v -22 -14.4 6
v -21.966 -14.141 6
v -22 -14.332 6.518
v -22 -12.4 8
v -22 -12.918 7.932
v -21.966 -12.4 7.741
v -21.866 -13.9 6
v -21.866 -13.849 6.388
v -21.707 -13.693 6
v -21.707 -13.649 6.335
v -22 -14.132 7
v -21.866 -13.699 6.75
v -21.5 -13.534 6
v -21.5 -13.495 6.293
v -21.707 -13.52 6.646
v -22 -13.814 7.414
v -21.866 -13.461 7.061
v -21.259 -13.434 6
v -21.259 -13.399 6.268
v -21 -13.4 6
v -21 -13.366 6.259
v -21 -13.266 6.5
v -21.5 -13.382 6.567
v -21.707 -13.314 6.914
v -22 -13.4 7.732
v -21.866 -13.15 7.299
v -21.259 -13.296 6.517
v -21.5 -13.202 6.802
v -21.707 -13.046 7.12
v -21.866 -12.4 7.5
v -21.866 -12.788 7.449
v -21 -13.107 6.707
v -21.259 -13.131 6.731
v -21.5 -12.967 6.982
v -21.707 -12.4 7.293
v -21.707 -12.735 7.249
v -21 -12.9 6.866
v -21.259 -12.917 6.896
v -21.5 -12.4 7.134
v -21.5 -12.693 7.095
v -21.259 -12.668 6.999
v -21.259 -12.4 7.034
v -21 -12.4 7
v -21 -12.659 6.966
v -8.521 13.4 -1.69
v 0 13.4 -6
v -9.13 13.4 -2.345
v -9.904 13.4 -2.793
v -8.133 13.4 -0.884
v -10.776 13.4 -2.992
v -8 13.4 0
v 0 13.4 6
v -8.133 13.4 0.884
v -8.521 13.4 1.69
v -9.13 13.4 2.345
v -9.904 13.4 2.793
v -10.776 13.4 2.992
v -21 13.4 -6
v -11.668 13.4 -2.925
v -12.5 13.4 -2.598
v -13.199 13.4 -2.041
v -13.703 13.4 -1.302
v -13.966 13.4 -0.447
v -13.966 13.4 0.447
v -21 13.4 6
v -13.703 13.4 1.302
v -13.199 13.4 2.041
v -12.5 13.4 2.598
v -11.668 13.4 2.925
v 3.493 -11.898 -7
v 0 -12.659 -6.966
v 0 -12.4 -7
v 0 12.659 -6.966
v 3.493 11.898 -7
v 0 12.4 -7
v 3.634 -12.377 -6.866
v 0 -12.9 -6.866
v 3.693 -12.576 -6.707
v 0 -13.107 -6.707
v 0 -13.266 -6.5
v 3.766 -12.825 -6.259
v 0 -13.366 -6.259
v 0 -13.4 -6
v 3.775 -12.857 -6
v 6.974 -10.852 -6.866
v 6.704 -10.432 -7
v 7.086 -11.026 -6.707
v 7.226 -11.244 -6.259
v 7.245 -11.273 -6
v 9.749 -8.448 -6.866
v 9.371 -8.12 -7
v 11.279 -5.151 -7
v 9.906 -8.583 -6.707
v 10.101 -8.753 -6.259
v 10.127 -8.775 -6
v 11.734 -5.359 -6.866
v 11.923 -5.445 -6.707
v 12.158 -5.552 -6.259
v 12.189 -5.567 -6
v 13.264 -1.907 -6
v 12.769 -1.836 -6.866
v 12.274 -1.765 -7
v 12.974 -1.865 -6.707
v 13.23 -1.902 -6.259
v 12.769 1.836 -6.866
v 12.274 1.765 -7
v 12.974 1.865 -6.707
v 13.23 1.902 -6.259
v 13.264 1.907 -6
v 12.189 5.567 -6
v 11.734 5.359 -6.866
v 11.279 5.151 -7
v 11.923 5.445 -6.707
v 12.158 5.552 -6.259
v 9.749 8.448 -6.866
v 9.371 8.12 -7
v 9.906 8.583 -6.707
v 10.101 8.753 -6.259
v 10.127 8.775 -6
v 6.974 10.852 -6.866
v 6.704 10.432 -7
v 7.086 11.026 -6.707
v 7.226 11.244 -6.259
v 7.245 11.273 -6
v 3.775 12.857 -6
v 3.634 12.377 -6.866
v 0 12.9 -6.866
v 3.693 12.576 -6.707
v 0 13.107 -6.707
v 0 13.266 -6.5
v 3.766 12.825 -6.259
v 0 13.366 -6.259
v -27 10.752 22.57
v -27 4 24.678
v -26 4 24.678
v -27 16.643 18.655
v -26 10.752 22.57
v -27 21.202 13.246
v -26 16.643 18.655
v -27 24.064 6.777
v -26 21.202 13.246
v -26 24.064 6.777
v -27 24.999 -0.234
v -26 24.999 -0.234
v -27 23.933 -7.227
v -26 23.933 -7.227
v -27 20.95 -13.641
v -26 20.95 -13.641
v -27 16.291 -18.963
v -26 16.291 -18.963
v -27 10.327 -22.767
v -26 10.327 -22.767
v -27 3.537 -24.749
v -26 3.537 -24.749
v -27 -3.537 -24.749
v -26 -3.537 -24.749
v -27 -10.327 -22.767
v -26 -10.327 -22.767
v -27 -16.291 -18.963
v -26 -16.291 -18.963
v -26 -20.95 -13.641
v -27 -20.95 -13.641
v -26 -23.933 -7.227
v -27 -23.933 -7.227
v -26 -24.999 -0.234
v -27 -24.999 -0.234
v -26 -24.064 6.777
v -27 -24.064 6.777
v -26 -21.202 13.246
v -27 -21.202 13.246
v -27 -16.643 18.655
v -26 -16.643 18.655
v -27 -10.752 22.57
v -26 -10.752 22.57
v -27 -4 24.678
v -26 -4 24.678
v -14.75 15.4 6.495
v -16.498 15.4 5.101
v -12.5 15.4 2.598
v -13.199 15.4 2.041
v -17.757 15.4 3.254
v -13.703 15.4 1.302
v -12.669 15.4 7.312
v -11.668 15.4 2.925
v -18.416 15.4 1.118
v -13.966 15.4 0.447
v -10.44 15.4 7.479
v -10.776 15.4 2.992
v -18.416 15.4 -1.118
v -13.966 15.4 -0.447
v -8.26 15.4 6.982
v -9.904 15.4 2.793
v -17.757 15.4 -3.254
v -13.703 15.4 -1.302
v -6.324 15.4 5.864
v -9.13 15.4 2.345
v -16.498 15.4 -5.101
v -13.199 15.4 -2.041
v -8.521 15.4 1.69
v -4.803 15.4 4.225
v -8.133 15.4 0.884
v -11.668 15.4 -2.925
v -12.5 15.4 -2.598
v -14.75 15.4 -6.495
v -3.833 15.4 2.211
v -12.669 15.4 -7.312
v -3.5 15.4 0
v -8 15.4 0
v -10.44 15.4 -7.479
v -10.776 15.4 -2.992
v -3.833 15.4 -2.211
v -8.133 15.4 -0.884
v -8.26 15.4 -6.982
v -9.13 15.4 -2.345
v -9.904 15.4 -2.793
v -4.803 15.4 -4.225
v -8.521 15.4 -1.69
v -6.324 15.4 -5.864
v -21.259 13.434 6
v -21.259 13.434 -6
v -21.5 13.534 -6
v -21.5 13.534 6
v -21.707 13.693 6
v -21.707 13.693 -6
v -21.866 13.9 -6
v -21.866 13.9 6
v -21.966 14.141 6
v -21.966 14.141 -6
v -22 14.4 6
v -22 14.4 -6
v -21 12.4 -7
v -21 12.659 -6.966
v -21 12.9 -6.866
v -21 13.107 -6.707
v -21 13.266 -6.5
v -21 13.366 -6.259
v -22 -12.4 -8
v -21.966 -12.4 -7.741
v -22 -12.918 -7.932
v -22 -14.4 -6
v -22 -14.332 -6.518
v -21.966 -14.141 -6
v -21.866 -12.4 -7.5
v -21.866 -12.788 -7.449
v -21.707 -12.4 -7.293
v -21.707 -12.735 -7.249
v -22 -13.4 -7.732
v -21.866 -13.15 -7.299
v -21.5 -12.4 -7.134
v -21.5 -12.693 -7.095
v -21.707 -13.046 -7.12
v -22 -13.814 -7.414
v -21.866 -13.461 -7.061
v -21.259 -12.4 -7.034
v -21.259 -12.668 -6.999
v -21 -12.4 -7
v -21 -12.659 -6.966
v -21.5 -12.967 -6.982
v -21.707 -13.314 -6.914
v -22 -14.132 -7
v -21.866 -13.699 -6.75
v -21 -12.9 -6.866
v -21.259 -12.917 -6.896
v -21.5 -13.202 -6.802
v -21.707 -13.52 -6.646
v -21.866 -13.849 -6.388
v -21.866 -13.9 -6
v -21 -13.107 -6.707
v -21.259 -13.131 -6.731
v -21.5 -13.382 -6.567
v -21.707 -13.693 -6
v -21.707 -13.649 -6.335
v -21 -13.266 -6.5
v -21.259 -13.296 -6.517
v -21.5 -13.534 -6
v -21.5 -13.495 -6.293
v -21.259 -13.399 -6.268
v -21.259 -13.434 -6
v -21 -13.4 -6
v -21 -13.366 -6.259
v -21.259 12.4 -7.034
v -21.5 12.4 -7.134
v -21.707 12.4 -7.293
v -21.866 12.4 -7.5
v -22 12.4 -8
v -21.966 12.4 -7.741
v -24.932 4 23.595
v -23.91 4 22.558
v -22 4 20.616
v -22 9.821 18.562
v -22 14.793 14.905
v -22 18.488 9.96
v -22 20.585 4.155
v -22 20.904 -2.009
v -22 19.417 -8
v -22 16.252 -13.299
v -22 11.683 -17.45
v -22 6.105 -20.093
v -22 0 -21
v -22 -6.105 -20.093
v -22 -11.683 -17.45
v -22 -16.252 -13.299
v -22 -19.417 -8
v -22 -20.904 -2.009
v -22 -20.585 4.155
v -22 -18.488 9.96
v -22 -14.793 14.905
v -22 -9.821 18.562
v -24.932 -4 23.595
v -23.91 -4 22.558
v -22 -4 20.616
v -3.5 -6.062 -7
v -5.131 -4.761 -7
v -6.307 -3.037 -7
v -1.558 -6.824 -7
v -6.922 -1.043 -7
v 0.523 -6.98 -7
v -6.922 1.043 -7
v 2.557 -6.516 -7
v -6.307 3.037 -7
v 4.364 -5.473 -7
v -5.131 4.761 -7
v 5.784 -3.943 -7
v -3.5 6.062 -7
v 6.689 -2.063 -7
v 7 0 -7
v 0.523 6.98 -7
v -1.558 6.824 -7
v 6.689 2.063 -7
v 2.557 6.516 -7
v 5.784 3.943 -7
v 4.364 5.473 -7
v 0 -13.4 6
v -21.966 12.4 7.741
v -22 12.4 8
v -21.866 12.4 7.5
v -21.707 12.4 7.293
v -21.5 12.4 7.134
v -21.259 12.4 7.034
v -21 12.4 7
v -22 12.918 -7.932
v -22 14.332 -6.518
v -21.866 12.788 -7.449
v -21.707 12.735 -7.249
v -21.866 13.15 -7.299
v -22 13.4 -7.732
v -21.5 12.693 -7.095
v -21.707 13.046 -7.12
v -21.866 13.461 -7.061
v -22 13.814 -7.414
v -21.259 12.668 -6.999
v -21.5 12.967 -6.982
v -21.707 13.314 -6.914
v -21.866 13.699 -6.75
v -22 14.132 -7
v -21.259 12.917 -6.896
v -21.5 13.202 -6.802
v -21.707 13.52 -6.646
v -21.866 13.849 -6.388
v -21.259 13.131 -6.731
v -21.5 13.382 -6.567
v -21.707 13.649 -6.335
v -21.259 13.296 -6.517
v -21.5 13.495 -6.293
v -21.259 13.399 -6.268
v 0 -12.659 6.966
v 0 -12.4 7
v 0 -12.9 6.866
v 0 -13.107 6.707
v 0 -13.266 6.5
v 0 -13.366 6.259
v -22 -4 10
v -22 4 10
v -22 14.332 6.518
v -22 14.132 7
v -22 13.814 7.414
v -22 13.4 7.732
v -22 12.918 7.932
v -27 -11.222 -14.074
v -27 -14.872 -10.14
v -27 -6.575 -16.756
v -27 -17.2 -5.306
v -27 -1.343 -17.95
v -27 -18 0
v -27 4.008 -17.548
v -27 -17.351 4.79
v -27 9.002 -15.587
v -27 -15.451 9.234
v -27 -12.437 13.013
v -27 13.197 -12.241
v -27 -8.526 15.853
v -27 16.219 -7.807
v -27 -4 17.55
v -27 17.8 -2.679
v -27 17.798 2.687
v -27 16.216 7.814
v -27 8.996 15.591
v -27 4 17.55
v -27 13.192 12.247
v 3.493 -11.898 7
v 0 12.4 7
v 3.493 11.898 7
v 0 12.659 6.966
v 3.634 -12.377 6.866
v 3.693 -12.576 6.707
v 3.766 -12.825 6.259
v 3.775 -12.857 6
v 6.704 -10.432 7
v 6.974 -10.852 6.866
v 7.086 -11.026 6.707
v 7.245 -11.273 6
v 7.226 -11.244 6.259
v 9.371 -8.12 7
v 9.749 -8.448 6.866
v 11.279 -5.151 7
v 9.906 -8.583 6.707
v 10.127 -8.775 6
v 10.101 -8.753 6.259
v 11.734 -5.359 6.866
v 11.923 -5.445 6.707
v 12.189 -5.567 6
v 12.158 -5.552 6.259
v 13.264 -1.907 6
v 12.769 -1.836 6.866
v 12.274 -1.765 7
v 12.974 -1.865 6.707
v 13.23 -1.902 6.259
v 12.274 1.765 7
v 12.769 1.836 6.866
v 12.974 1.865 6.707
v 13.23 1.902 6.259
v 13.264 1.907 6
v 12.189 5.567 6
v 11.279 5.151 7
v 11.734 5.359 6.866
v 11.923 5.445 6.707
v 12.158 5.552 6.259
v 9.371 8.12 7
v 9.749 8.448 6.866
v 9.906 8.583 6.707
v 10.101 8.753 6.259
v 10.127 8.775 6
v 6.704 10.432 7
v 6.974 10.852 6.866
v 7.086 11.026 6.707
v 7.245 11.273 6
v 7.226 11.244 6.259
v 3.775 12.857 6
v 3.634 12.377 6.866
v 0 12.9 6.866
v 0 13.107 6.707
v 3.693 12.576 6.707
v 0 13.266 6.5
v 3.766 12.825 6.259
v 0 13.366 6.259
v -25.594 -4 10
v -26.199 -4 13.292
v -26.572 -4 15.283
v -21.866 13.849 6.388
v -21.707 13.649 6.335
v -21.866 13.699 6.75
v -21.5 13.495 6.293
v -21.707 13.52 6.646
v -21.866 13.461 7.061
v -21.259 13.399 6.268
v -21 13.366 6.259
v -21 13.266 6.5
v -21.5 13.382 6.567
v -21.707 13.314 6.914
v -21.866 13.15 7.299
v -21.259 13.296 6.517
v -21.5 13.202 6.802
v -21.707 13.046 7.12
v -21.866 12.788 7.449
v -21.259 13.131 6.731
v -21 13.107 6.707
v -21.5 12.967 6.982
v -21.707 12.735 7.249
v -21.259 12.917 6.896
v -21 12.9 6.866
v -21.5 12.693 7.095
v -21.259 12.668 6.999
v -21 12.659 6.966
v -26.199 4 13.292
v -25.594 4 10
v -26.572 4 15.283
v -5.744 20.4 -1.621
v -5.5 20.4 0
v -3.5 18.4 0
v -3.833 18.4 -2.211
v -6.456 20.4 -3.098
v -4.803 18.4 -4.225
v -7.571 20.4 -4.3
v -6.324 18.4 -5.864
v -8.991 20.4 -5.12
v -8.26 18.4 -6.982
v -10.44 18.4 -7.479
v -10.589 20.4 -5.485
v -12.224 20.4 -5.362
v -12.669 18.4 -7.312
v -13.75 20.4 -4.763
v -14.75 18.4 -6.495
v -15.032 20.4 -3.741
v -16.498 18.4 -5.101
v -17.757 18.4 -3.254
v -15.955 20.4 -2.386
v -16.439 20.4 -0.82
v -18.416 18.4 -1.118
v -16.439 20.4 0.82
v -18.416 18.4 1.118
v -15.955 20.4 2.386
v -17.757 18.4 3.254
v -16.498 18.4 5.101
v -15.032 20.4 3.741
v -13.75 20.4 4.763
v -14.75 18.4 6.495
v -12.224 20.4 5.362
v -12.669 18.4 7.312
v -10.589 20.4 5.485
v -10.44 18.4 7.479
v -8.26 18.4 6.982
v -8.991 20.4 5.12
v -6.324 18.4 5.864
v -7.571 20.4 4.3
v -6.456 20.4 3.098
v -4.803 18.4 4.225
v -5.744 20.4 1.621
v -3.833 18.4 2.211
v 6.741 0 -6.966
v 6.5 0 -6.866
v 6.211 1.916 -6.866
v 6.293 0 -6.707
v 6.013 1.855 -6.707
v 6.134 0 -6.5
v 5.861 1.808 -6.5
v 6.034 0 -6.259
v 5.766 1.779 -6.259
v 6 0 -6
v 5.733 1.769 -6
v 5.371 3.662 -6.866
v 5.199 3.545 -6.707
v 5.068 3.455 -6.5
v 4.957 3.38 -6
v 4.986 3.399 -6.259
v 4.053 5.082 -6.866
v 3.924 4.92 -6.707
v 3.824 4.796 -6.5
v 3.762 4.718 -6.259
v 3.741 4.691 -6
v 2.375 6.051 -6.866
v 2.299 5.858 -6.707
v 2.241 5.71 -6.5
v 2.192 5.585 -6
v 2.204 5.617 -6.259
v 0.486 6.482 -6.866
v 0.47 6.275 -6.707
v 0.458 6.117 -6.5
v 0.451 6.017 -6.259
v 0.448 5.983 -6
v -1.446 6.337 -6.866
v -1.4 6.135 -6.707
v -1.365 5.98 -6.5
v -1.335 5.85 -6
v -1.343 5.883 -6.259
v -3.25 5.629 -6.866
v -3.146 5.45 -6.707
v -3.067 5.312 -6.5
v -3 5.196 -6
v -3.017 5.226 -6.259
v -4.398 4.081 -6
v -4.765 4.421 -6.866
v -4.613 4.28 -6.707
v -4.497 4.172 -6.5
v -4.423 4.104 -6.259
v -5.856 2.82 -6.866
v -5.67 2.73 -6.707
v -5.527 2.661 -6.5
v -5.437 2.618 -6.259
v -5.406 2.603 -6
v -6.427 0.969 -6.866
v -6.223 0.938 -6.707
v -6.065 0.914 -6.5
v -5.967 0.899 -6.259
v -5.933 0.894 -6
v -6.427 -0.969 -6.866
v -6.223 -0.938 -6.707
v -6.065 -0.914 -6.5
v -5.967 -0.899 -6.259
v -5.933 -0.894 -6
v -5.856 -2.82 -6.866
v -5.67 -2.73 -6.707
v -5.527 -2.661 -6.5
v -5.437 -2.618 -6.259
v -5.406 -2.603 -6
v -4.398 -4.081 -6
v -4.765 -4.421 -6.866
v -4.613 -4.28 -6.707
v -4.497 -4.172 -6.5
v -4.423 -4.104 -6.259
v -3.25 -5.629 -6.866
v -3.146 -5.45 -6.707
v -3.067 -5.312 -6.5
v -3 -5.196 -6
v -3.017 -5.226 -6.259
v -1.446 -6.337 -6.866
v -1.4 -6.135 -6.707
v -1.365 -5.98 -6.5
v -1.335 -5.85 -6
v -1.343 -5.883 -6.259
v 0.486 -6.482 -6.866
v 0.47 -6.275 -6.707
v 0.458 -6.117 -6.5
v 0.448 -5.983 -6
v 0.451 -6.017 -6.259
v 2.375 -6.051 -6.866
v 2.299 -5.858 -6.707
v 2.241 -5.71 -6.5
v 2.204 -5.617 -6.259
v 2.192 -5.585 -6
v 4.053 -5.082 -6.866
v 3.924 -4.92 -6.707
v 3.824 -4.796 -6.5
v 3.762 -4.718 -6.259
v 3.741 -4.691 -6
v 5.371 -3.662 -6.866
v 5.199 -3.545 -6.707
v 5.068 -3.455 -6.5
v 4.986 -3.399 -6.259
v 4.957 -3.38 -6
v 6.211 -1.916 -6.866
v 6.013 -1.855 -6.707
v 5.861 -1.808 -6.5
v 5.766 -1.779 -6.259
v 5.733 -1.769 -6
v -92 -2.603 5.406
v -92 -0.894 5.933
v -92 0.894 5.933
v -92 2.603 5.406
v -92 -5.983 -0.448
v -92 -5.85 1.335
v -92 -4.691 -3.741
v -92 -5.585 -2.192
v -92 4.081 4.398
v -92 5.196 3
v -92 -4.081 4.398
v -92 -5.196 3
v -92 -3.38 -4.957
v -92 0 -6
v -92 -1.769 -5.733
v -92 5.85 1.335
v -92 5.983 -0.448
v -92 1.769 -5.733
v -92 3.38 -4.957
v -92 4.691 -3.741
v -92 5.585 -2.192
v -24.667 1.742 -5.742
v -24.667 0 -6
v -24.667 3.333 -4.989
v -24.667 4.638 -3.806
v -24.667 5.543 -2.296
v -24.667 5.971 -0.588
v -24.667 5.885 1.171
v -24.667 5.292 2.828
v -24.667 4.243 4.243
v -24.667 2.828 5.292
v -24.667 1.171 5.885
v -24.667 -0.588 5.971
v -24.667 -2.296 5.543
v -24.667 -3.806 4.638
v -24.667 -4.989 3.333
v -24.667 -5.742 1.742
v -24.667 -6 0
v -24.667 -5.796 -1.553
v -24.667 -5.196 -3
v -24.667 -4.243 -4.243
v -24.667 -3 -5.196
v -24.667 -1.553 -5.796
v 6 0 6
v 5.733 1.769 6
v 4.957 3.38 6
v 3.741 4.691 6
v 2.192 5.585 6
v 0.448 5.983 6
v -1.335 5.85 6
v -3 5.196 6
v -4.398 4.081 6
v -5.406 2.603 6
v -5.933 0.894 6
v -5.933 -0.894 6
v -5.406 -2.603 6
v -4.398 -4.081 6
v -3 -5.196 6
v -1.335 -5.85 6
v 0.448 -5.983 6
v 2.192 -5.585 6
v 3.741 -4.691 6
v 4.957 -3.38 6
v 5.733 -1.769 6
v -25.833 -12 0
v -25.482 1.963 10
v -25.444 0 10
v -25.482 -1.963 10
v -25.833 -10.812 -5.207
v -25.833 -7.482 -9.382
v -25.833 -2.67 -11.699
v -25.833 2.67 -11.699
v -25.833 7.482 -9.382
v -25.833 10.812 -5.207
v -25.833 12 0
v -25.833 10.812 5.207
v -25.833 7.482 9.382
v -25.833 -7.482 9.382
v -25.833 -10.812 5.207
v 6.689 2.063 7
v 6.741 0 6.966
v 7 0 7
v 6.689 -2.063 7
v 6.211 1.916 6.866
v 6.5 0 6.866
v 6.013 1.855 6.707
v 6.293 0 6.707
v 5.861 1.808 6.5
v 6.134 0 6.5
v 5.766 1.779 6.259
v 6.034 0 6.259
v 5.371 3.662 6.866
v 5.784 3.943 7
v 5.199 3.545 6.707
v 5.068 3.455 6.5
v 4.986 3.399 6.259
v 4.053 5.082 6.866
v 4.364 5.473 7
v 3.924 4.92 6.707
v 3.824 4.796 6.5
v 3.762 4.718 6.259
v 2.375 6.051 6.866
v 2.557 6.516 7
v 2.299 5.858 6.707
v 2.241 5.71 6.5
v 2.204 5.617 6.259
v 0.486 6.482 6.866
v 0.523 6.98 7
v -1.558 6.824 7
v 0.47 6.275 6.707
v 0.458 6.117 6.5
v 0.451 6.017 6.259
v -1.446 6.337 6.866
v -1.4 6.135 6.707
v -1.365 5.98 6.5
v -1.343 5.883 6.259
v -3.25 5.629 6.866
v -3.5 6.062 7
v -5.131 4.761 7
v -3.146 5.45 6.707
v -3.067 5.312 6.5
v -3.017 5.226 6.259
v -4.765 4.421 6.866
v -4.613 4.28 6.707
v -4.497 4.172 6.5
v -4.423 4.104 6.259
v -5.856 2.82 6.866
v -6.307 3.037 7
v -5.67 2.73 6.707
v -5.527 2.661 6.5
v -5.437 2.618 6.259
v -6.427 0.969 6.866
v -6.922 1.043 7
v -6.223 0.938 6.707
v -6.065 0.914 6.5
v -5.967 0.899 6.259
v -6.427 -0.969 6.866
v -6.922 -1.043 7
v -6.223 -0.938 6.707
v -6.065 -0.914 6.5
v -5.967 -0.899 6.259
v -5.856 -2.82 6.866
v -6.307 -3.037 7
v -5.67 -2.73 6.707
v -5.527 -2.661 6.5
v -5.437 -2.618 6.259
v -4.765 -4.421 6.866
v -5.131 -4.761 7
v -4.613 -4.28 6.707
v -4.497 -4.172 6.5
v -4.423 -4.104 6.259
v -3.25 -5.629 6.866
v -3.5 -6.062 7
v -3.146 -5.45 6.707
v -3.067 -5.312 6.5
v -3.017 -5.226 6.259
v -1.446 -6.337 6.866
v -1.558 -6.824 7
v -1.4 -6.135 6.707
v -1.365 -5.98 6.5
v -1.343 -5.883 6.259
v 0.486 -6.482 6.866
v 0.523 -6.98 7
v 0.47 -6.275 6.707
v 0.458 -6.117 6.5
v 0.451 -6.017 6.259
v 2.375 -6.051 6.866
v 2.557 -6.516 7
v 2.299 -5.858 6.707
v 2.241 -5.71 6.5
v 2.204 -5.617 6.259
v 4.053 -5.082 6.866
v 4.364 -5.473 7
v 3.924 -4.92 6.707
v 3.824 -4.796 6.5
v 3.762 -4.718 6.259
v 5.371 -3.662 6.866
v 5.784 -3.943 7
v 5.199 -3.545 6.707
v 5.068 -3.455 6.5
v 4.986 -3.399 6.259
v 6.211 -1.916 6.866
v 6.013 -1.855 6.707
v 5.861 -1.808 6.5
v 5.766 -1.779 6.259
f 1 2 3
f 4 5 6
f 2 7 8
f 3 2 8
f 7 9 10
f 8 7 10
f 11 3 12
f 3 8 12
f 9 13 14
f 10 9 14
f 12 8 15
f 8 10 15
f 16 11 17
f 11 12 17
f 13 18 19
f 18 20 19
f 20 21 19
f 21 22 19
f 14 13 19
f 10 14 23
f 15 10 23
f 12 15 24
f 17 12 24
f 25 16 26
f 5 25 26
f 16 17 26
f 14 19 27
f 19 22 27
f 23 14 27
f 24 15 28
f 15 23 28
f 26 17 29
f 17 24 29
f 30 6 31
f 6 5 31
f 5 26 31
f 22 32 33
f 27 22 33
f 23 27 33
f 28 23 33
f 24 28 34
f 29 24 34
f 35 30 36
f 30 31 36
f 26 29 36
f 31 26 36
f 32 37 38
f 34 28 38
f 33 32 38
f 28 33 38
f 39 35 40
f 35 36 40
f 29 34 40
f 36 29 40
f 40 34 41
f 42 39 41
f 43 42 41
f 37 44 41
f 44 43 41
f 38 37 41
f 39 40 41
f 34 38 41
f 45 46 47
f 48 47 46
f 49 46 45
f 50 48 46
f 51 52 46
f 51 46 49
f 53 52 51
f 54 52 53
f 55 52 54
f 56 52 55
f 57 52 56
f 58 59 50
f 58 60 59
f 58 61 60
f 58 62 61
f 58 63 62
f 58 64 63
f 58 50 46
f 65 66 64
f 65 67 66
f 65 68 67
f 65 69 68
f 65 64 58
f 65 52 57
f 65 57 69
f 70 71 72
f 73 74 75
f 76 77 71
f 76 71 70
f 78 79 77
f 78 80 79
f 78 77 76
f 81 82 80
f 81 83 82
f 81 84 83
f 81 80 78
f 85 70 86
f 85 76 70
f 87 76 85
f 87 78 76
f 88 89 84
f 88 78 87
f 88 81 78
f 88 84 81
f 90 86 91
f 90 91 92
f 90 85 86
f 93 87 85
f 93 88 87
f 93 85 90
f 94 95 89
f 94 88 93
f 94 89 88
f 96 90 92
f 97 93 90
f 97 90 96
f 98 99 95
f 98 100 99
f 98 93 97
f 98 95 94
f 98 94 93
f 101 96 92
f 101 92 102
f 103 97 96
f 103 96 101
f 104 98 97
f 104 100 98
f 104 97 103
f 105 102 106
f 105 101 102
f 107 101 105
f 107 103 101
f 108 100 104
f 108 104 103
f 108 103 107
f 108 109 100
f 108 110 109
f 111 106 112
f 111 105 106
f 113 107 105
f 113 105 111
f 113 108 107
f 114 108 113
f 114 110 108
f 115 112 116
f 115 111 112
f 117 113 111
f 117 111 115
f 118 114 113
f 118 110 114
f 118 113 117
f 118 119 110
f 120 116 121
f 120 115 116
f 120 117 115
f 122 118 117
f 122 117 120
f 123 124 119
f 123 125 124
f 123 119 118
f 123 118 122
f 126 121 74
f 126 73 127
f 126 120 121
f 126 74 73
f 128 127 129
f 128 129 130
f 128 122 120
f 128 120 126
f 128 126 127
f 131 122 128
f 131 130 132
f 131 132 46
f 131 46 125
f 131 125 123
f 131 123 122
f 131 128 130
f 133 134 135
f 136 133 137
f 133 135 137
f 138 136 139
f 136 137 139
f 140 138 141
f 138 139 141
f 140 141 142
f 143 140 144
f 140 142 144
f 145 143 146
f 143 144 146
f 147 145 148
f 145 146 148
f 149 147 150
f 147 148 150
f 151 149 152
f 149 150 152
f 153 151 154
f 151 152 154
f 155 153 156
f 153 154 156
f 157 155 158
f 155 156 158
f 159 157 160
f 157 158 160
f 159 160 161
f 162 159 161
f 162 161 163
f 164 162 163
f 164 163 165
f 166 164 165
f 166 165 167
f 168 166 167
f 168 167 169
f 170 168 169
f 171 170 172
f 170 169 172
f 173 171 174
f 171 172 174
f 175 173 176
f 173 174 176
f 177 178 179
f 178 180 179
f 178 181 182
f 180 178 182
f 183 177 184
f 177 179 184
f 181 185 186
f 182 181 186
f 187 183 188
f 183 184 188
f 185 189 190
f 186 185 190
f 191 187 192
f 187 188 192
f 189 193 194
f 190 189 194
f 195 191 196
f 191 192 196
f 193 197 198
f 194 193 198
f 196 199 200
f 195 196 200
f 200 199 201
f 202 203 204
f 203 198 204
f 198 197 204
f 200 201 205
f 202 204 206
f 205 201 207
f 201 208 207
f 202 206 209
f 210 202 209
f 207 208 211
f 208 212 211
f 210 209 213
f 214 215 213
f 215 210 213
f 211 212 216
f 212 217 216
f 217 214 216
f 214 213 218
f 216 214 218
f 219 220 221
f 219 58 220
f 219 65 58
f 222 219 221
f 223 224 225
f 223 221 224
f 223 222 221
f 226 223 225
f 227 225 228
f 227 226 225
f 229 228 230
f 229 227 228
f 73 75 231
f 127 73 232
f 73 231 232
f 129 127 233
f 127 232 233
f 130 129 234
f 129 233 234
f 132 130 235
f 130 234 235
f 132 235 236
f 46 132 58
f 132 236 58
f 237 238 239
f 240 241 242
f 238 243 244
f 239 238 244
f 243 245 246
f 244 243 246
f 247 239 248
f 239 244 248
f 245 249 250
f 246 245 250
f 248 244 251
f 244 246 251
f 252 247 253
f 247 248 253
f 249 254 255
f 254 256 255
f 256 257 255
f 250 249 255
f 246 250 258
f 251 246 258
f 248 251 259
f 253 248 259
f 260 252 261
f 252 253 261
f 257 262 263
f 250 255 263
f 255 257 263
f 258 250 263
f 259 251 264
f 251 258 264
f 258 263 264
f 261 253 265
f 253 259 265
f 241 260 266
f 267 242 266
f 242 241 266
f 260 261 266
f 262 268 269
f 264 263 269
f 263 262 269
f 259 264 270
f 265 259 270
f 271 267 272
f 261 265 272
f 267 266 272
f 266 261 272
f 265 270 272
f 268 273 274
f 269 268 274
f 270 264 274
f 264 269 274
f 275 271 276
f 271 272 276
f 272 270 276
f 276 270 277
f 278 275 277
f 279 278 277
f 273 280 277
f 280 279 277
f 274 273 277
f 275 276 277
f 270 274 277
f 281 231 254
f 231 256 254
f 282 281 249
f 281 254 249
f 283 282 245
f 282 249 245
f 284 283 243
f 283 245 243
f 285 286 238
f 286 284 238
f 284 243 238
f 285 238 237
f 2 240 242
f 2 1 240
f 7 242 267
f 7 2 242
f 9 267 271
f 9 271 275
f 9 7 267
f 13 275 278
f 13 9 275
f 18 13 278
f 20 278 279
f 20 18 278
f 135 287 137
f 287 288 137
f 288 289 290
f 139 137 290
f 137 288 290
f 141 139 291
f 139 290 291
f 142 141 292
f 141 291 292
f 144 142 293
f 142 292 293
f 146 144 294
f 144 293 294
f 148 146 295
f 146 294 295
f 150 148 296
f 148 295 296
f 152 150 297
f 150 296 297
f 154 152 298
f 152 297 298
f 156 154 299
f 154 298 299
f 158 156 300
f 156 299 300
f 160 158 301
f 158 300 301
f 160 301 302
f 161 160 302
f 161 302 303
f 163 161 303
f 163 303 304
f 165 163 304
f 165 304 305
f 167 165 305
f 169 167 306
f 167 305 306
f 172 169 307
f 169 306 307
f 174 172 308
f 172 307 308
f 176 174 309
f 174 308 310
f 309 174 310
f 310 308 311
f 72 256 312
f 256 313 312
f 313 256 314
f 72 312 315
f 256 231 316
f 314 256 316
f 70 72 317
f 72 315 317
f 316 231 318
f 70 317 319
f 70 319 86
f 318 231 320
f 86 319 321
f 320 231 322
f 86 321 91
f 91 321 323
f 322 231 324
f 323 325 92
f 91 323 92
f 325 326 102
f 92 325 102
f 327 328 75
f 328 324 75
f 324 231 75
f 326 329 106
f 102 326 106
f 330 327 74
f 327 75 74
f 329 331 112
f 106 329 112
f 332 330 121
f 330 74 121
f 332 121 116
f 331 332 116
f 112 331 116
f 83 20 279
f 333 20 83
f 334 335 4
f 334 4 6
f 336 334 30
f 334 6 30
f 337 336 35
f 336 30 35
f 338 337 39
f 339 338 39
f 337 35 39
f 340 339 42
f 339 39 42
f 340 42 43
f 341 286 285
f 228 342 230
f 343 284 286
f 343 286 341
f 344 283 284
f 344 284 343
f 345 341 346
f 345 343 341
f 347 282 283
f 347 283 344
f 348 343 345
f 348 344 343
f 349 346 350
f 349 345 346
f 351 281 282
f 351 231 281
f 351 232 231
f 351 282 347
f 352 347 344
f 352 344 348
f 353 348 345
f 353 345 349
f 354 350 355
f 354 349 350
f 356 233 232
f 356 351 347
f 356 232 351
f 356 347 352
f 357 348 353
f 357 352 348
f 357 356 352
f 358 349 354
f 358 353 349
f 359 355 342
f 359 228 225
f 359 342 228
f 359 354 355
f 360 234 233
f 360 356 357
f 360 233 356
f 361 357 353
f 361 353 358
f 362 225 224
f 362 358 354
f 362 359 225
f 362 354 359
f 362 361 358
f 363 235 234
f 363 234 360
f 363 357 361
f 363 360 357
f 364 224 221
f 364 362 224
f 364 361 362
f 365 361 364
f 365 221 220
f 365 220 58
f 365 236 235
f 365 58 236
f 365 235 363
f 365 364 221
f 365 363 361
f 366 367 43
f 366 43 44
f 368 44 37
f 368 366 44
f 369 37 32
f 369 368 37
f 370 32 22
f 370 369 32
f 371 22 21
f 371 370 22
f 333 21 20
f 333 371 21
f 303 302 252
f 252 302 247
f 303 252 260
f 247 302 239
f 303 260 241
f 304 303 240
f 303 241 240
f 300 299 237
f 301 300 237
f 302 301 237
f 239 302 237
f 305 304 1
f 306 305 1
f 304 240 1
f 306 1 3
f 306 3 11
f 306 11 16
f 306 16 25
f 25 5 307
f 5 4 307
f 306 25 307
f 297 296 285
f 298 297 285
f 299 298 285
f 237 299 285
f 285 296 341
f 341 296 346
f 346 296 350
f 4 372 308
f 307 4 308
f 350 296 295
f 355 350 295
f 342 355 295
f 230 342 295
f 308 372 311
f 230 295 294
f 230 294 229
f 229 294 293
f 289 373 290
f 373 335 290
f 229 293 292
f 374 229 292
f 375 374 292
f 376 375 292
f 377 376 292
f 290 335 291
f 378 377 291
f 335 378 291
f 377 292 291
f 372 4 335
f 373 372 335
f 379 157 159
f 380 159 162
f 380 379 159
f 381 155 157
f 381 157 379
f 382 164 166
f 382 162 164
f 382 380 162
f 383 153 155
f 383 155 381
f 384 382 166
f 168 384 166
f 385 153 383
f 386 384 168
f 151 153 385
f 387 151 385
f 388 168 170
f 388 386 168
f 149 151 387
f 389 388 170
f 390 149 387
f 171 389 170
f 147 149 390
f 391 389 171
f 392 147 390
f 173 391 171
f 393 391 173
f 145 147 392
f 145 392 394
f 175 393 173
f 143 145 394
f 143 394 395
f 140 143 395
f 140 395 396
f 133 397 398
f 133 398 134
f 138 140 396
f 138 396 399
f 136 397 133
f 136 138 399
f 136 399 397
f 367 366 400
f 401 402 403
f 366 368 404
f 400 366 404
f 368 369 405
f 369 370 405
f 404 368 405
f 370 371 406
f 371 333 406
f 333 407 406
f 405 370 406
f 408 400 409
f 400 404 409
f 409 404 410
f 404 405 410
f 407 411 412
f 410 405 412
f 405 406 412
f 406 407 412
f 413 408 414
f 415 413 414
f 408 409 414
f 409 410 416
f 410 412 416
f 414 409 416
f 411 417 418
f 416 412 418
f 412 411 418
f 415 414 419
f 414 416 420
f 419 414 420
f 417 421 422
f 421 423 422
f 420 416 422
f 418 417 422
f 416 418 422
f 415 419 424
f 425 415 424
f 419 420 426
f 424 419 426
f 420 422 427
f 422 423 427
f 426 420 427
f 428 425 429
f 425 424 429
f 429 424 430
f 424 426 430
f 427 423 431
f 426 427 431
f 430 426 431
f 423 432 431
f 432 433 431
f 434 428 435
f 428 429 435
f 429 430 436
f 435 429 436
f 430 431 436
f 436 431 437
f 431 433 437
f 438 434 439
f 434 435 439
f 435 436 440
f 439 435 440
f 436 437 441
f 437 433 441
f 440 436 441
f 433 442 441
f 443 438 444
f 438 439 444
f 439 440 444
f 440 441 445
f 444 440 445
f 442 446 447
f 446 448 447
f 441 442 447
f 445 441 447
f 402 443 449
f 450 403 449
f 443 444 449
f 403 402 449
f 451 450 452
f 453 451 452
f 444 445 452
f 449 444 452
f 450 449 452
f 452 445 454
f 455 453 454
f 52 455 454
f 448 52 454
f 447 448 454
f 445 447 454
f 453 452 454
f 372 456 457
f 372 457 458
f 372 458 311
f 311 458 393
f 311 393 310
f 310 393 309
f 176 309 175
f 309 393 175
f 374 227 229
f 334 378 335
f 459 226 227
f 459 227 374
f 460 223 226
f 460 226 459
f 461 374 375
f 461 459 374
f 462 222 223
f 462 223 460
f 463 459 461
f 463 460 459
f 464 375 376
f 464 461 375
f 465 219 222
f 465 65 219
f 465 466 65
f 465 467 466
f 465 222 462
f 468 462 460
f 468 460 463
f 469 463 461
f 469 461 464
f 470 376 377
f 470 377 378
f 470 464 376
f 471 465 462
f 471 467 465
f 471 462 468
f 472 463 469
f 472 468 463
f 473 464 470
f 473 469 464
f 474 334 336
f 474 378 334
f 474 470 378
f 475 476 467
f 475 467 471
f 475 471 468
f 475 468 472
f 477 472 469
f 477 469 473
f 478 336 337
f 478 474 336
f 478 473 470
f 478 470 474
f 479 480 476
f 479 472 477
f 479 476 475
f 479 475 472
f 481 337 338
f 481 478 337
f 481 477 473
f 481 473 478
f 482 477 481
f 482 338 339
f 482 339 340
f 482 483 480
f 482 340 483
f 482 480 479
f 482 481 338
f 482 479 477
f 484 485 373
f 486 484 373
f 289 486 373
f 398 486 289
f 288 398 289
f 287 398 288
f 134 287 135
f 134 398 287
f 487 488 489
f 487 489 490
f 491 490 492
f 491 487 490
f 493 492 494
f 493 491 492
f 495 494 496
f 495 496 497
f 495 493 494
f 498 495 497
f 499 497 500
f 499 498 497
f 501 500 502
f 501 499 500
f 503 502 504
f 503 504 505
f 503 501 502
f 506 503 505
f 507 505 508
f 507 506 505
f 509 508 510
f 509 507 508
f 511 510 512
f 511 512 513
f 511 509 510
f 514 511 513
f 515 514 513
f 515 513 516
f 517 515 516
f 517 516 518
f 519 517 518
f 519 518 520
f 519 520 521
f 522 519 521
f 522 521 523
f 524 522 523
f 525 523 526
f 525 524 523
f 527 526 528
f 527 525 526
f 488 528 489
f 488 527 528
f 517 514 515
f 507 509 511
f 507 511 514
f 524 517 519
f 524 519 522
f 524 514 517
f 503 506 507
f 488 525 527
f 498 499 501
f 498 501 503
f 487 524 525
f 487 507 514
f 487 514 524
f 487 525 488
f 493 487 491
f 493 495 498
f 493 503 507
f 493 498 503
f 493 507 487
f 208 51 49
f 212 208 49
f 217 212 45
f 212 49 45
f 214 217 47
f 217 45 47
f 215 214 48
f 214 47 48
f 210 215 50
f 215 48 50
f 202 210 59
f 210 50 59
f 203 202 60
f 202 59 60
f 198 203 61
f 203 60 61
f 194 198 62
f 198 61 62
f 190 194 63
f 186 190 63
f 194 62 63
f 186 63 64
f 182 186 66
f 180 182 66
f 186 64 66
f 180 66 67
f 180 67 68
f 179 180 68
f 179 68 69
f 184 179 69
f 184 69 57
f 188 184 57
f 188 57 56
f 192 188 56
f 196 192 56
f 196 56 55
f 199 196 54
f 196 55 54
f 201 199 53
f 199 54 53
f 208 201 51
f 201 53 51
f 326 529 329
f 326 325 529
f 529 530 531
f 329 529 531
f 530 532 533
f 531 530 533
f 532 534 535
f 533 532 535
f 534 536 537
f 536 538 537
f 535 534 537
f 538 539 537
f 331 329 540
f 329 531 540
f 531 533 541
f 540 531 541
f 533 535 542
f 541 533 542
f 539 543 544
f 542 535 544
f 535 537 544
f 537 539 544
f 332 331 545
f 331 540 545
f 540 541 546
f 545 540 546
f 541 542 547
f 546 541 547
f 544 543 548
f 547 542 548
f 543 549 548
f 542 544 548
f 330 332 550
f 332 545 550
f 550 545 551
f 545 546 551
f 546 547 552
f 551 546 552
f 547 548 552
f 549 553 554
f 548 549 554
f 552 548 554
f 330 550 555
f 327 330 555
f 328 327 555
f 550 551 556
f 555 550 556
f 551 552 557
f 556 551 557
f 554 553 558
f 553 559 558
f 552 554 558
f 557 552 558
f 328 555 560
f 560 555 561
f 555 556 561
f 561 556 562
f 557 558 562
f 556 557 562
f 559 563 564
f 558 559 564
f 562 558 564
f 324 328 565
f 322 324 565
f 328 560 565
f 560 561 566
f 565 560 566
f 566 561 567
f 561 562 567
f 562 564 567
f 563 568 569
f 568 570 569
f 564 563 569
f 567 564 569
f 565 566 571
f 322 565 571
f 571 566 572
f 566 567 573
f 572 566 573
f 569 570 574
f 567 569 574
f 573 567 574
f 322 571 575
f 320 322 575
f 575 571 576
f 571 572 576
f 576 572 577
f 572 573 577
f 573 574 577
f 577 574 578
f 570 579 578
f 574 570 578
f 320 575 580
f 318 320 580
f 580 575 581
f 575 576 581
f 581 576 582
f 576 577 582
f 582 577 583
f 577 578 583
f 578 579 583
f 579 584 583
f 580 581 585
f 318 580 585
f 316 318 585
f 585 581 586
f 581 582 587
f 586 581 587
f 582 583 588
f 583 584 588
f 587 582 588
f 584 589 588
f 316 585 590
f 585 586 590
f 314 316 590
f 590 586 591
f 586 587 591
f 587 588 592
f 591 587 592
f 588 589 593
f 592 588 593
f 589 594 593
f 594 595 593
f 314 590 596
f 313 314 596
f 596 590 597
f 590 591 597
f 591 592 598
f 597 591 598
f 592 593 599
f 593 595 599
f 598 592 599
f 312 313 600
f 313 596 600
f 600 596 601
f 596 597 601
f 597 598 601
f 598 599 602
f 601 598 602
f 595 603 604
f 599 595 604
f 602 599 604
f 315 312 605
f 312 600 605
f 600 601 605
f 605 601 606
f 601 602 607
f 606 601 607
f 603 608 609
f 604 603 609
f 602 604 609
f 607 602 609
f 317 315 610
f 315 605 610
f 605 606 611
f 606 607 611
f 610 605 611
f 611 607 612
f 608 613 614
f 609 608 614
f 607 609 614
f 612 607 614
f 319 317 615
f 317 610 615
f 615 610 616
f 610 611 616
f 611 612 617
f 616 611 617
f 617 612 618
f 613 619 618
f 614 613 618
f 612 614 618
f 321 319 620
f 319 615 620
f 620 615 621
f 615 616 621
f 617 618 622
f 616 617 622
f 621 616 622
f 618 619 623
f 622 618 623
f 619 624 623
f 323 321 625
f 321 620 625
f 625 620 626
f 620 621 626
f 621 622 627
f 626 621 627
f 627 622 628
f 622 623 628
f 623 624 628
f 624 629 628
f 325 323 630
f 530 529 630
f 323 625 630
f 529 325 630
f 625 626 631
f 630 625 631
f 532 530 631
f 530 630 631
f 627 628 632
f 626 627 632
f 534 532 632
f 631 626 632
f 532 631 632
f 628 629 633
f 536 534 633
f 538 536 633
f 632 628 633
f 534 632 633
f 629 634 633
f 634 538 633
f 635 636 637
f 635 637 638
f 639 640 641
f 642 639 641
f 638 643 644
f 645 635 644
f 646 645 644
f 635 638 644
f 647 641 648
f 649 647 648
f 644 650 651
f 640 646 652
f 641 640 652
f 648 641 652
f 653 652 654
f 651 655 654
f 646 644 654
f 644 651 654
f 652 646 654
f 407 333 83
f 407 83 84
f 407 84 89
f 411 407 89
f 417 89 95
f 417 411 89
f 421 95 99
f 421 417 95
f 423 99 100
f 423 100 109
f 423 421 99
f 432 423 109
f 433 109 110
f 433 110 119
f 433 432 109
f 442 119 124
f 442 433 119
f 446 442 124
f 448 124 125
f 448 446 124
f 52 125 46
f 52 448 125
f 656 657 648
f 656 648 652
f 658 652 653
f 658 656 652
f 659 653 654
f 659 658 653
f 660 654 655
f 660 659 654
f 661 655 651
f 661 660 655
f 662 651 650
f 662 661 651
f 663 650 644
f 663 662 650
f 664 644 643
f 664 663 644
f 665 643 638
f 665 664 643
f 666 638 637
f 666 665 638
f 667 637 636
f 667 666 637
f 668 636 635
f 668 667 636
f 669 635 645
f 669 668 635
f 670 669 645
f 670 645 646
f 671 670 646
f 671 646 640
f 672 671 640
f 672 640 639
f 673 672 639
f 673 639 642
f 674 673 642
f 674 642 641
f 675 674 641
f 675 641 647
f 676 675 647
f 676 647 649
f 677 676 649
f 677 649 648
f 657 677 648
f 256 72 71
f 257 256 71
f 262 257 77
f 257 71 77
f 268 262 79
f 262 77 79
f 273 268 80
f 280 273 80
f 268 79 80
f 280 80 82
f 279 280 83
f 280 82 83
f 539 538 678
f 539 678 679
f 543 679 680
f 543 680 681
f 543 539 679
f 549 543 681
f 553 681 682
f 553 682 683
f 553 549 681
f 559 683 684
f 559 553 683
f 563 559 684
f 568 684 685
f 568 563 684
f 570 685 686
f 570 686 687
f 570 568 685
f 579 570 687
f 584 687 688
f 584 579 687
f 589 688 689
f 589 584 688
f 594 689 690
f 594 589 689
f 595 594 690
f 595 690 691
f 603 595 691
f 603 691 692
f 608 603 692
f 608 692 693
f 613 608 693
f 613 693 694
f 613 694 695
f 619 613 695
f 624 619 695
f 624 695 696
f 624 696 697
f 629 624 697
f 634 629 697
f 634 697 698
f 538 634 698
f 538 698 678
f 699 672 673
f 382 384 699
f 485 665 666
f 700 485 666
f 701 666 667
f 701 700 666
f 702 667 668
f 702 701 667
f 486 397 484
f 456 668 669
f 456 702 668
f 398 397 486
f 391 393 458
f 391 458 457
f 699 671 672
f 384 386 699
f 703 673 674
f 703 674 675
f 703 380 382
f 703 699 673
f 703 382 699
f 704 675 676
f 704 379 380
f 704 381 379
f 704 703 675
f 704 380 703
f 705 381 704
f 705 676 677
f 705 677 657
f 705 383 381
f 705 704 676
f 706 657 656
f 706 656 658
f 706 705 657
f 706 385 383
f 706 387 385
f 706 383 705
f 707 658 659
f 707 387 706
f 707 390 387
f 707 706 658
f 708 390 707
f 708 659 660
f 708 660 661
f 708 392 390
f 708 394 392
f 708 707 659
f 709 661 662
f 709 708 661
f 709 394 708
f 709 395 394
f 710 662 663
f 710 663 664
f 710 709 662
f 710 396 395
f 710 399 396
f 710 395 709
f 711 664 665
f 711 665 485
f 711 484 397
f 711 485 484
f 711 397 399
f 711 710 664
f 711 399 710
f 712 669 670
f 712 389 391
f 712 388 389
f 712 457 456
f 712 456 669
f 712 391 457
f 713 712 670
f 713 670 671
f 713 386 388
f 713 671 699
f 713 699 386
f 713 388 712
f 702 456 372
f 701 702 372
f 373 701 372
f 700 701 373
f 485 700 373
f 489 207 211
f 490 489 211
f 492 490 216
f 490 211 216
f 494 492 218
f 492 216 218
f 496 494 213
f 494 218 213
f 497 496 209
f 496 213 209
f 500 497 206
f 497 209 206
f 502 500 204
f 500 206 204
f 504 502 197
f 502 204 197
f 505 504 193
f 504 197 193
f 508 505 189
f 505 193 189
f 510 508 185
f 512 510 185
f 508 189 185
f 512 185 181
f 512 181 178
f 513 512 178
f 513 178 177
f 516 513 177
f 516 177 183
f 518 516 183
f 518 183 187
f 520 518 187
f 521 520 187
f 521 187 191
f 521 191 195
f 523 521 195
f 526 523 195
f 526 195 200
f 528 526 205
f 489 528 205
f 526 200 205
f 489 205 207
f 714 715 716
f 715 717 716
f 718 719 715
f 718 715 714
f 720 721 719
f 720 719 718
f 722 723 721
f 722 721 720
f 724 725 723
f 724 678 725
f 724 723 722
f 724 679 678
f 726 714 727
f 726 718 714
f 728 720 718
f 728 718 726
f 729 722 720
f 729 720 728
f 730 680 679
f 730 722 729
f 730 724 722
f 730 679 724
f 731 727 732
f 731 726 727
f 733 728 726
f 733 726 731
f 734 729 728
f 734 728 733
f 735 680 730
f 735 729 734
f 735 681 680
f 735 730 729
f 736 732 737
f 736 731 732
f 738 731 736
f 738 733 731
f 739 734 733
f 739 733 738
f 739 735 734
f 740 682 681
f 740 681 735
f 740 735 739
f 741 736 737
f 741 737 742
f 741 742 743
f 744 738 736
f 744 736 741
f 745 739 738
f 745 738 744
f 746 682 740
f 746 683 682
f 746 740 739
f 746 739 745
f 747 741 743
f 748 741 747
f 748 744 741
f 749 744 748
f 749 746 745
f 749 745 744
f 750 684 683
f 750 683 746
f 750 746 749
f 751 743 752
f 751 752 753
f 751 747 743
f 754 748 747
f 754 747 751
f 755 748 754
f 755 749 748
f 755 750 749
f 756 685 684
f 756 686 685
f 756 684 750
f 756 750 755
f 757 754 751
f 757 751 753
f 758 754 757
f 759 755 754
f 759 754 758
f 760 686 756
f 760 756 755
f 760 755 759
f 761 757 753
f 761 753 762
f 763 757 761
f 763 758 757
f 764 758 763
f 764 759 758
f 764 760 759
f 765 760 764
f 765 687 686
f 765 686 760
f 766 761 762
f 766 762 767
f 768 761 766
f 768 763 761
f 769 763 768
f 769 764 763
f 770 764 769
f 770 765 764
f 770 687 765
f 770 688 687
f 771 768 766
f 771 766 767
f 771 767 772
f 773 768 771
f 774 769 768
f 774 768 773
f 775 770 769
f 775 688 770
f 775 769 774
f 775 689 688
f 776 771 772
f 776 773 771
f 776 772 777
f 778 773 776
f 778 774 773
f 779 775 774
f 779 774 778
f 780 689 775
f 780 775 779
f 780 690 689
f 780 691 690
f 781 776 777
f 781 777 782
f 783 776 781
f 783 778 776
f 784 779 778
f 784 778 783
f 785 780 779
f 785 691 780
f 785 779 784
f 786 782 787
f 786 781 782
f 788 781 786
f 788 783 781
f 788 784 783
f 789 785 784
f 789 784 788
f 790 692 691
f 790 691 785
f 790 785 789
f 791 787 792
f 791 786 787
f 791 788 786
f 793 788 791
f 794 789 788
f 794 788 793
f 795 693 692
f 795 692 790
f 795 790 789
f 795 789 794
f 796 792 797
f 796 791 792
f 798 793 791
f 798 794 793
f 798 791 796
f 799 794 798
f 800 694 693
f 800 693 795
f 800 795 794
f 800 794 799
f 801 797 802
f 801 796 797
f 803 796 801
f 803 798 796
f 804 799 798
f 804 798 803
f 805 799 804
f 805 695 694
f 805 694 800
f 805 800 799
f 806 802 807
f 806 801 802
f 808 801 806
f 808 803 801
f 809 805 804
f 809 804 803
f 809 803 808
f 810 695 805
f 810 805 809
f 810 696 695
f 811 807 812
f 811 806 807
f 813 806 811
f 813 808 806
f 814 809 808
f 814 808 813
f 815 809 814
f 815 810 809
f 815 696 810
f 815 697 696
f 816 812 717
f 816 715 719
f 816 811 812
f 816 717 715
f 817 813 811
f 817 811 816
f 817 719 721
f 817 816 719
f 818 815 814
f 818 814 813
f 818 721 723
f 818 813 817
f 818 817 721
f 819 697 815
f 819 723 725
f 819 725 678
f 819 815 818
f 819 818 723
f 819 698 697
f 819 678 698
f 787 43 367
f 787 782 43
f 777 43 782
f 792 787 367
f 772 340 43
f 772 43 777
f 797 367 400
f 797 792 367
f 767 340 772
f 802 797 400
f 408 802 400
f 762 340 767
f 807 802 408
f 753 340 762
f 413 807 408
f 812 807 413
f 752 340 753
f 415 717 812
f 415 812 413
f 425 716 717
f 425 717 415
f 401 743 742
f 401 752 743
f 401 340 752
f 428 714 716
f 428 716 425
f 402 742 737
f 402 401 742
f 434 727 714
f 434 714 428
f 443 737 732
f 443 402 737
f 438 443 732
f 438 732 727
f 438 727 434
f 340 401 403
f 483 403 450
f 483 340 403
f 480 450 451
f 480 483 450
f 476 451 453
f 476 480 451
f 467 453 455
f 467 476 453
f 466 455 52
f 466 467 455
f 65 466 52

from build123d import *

# Parameters (mm, degrees)
SKETCH1_R               = 6
BOSS_EXTRUDE3_DEPTH     = 7
SKETCH6_R               = 25
BOSS_EXTRUDE4_DEPTH     = 5
CHAMFER1_SIZE           = 4
SKETCH8_R               = 6
BOSS_EXTRUDE5_DEPTH     = 70
SKETCH9_R               = 3
BOSS_EXTRUDE6_DEPTH     = 2
SKETCH10_R              = 7.5
BOSS_EXTRUDE7_DEPTH     = 5
CHAMFER2_SIZE           = 2
SKETCH13_W              = 30
SKETCH13_H              = 8
CUT_EXTRUDE1_DEPTH      = 66
CUT_EXTRUDE1_DEPTH_BACK = 41.4
FILLET1_R               = 1


with BuildPart() as part:
    # Sketch1 → Boss-Extrude3 (new body, symmetric)
    with BuildSketch(Plane.XY):
        with BuildLine():
            Line((0, 13.4), (-22, 13.4))
            Line((-22, 13.4), (-22, -13.4))
            Line((-22, -13.4), (0, -13.4))
            ThreePointArc((0, -13.4), (13.4, 0), (0, 13.4))
        make_face()
        Circle(SKETCH1_R, mode=Mode.SUBTRACT)
    extrude(amount=BOSS_EXTRUDE3_DEPTH, both=True)

    # Sketch6 → Boss-Extrude4 (add)
    with BuildSketch(Plane.ZY.offset(22)):
        Circle(SKETCH6_R)
    extrude(amount=BOSS_EXTRUDE4_DEPTH)

    # Sketch7 → Cut-Revolve2 (revolve, cut)
    with BuildSketch(Plane.XY):
        Polygon((-27, 0), (-23.5, 0), (-27, -18), align=None)
    revolve(axis=Axis((-27, 0, 0), (1, 0, 0)), mode=Mode.SUBTRACT)

    # Chamfer1
    chamfer1_edges = [part.edges().sort_by_distance(p)[0] for p in [
        (-22, 0, -25),
    ]]
    chamfer(chamfer1_edges, length=CHAMFER1_SIZE)

    # Sketch8 → Boss-Extrude5 (add)
    with BuildSketch(Plane(origin=(-22, 0, 0), x_dir=(0, 0, -1), z_dir=(1, 0, 0))):
        Circle(SKETCH8_R)
    extrude(amount=-BOSS_EXTRUDE5_DEPTH)

    # Sketch9 → Boss-Extrude6 (add)
    with BuildSketch(Plane(origin=(0, 13.4, 0), x_dir=(1, 0, 0), z_dir=(0, 1, 0))):
        with Locations((-11, 0)):
            Circle(SKETCH9_R)
    extrude(amount=BOSS_EXTRUDE6_DEPTH)

    # Sketch10 → Boss-Extrude7 (add)
    with BuildSketch(Plane(origin=(0, 15.4, 0), x_dir=(1, 0, 0), z_dir=(0, 1, 0))):
        with Locations((-11, 0)):
            Circle(SKETCH10_R)
    extrude(amount=BOSS_EXTRUDE7_DEPTH)

    # Chamfer2
    chamfer2_edges = [part.edges().sort_by_distance(p)[0] for p in [
        (-18.5, 20.4, 0),
    ]]
    chamfer(chamfer2_edges, length=CHAMFER2_SIZE)

    # Sketch13 → Cut-Extrude1 (cut, two sides)
    with BuildSketch(Plane.ZY.offset(27)) as cut_extrude1_sk:
        with Locations((25, 0)):
            Rectangle(SKETCH13_W, SKETCH13_H)
    extrude(amount=CUT_EXTRUDE1_DEPTH, mode=Mode.SUBTRACT)
    extrude(cut_extrude1_sk.sketch, amount=-CUT_EXTRUDE1_DEPTH_BACK, mode=Mode.SUBTRACT)

    # Fillet1
    fillet1_edges = [part.edges().sort_by_distance(p)[0] for p in [
        (-6, 0, -7),
        (-6, 0, 7),
        (-22, 0, 7),
        (-11, -13.4, 7),
        (13.4, 0, 7),
        (-11, -13.4, -7),
        (-22, 0, -7),
        (-11, 13.4, -7),
        (13.4, 0, -7),
        (-22, -13.4, 0),
        (-22, 13.4, 0),
        (-11, 13.4, 7),
    ]]
    fillet(fillet1_edges, radius=FILLET1_R)


solid = part.part
